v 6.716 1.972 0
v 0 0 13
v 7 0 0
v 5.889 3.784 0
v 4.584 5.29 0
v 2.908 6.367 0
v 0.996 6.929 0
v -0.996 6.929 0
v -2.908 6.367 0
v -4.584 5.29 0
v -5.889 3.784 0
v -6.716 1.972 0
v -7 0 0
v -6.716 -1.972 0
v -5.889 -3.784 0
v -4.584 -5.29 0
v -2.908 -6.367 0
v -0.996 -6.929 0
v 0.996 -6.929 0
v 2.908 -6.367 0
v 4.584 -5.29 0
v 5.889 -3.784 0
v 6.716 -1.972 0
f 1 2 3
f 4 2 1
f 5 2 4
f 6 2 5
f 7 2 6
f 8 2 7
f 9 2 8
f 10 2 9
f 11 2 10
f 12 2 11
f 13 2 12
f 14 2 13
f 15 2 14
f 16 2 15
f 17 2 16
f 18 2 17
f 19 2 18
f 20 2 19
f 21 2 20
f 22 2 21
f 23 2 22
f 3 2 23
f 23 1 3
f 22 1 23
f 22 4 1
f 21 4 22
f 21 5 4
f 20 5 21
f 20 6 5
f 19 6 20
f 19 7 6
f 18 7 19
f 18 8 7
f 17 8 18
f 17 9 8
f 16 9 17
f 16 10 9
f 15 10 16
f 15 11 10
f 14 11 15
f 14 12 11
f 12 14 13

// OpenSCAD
// Generated by SolidPython 1.0.1 on 2020-07-29 00:46:43


cylinder(h = 13, r1 = 7, r2 = 0);
/***********************************************
*********      SolidPython code:      **********
************************************************
 
# import packages: SolidPython
from solid import *
from solid.utils import *
from itertools import chain, combinations, permutations


class Resize:

    def __init__(self, scad_file):
        self.scad_file = scad_file
        #self.scad_file = import_scad(scad_file)
        # cone/cylinder param:
        self.r1 = 0
        self.r2 = 0
        self.h = 0
        # rectangular prism param:
        self.w = 0
        self.l = 0
        # ellipse param:
        self.r = 0

    # import OpenScad code (file name corresponds to shape)


    # classify shape + parameters
    def assign(self, param1, param2, param3):
        if self.scad_file == 'cone.scad':
            self.r1 = param1
            self.r2 = param2
            self.h = param3
        elif self.scad_file == 'cylinder.scad':
            self.r1 = param1
            self.r2 = param2
            self.h = param3
        elif self.scad_file == 'rectangularPrism.scad':
            self.h = param1
            self.l = param2
            self.w = param3
        else:
            self.r = param1
            self.h = param2

    # resize parameters
    def iterate(self):
        x = range(3, 20, 2)
        i = 1
        if self.scad_file == 'cone.scad':
            tempList = list(permutations(x, 2))
            for temp in tempList:
                param1 = temp[0]
                param2 = temp[1]
                filepath = 'produced_scad_files/' + 'cone' + str(param1) + '_' + str(param2) + '_' + '.scad'
                scad_render_to_file(cylinder(h=param1, r1=param2, r2=0), filepath)

        elif self.scad_file == 'cylinder.scad':
            tempList = list(permutations(x, 3))
            for temp in tempList:
                param1 = temp[0]
                param2 = temp[1]
                filepath = 'produced_scad_files/' + 'cylinder' + str(param1) + '_' + str(param2) + '_' + '.scad'
                scad_render_to_file(cylinder(h=param1, r1=param2, r2=param2), filepath)

        elif self.scad_file == 'rectangularPrism.scad':
            tempList = list(permutations(x, 3))
            for temp in tempList:
                param1 = temp[0]
                param2 = temp[1]
                param3 = temp[2]
                filepath = 'produced_scad_files/' + 'rectangularPrism' + str(param1) + '_' + str(param2) + '_' + str(
                    param3) + '.scad'
                scad_render_to_file(cube(size=(param1, param2, param3)), filepath)

        elif self.scad_file == 'ellipse.scad':
            tempList = list(permutations(x, 4))
            for temp in tempList:
                param1 = temp[0]
                param2 = temp[1]
                param3 = temp[2]
                param4 = temp[3]
                filepath = 'produced_scad_files/' + 'ellipse' + str(param1) + '_' + str(param2) + '_' + str(param3) + '_' + str(param4) + '.scad'
                scad_render_to_file(scale([param1, param2, param3])(sphere(r=param4)), filepath)

    def render_to_scadfile(self):
        scad_render_to_file(scad, 'example.scad') 
 
************************************************/
